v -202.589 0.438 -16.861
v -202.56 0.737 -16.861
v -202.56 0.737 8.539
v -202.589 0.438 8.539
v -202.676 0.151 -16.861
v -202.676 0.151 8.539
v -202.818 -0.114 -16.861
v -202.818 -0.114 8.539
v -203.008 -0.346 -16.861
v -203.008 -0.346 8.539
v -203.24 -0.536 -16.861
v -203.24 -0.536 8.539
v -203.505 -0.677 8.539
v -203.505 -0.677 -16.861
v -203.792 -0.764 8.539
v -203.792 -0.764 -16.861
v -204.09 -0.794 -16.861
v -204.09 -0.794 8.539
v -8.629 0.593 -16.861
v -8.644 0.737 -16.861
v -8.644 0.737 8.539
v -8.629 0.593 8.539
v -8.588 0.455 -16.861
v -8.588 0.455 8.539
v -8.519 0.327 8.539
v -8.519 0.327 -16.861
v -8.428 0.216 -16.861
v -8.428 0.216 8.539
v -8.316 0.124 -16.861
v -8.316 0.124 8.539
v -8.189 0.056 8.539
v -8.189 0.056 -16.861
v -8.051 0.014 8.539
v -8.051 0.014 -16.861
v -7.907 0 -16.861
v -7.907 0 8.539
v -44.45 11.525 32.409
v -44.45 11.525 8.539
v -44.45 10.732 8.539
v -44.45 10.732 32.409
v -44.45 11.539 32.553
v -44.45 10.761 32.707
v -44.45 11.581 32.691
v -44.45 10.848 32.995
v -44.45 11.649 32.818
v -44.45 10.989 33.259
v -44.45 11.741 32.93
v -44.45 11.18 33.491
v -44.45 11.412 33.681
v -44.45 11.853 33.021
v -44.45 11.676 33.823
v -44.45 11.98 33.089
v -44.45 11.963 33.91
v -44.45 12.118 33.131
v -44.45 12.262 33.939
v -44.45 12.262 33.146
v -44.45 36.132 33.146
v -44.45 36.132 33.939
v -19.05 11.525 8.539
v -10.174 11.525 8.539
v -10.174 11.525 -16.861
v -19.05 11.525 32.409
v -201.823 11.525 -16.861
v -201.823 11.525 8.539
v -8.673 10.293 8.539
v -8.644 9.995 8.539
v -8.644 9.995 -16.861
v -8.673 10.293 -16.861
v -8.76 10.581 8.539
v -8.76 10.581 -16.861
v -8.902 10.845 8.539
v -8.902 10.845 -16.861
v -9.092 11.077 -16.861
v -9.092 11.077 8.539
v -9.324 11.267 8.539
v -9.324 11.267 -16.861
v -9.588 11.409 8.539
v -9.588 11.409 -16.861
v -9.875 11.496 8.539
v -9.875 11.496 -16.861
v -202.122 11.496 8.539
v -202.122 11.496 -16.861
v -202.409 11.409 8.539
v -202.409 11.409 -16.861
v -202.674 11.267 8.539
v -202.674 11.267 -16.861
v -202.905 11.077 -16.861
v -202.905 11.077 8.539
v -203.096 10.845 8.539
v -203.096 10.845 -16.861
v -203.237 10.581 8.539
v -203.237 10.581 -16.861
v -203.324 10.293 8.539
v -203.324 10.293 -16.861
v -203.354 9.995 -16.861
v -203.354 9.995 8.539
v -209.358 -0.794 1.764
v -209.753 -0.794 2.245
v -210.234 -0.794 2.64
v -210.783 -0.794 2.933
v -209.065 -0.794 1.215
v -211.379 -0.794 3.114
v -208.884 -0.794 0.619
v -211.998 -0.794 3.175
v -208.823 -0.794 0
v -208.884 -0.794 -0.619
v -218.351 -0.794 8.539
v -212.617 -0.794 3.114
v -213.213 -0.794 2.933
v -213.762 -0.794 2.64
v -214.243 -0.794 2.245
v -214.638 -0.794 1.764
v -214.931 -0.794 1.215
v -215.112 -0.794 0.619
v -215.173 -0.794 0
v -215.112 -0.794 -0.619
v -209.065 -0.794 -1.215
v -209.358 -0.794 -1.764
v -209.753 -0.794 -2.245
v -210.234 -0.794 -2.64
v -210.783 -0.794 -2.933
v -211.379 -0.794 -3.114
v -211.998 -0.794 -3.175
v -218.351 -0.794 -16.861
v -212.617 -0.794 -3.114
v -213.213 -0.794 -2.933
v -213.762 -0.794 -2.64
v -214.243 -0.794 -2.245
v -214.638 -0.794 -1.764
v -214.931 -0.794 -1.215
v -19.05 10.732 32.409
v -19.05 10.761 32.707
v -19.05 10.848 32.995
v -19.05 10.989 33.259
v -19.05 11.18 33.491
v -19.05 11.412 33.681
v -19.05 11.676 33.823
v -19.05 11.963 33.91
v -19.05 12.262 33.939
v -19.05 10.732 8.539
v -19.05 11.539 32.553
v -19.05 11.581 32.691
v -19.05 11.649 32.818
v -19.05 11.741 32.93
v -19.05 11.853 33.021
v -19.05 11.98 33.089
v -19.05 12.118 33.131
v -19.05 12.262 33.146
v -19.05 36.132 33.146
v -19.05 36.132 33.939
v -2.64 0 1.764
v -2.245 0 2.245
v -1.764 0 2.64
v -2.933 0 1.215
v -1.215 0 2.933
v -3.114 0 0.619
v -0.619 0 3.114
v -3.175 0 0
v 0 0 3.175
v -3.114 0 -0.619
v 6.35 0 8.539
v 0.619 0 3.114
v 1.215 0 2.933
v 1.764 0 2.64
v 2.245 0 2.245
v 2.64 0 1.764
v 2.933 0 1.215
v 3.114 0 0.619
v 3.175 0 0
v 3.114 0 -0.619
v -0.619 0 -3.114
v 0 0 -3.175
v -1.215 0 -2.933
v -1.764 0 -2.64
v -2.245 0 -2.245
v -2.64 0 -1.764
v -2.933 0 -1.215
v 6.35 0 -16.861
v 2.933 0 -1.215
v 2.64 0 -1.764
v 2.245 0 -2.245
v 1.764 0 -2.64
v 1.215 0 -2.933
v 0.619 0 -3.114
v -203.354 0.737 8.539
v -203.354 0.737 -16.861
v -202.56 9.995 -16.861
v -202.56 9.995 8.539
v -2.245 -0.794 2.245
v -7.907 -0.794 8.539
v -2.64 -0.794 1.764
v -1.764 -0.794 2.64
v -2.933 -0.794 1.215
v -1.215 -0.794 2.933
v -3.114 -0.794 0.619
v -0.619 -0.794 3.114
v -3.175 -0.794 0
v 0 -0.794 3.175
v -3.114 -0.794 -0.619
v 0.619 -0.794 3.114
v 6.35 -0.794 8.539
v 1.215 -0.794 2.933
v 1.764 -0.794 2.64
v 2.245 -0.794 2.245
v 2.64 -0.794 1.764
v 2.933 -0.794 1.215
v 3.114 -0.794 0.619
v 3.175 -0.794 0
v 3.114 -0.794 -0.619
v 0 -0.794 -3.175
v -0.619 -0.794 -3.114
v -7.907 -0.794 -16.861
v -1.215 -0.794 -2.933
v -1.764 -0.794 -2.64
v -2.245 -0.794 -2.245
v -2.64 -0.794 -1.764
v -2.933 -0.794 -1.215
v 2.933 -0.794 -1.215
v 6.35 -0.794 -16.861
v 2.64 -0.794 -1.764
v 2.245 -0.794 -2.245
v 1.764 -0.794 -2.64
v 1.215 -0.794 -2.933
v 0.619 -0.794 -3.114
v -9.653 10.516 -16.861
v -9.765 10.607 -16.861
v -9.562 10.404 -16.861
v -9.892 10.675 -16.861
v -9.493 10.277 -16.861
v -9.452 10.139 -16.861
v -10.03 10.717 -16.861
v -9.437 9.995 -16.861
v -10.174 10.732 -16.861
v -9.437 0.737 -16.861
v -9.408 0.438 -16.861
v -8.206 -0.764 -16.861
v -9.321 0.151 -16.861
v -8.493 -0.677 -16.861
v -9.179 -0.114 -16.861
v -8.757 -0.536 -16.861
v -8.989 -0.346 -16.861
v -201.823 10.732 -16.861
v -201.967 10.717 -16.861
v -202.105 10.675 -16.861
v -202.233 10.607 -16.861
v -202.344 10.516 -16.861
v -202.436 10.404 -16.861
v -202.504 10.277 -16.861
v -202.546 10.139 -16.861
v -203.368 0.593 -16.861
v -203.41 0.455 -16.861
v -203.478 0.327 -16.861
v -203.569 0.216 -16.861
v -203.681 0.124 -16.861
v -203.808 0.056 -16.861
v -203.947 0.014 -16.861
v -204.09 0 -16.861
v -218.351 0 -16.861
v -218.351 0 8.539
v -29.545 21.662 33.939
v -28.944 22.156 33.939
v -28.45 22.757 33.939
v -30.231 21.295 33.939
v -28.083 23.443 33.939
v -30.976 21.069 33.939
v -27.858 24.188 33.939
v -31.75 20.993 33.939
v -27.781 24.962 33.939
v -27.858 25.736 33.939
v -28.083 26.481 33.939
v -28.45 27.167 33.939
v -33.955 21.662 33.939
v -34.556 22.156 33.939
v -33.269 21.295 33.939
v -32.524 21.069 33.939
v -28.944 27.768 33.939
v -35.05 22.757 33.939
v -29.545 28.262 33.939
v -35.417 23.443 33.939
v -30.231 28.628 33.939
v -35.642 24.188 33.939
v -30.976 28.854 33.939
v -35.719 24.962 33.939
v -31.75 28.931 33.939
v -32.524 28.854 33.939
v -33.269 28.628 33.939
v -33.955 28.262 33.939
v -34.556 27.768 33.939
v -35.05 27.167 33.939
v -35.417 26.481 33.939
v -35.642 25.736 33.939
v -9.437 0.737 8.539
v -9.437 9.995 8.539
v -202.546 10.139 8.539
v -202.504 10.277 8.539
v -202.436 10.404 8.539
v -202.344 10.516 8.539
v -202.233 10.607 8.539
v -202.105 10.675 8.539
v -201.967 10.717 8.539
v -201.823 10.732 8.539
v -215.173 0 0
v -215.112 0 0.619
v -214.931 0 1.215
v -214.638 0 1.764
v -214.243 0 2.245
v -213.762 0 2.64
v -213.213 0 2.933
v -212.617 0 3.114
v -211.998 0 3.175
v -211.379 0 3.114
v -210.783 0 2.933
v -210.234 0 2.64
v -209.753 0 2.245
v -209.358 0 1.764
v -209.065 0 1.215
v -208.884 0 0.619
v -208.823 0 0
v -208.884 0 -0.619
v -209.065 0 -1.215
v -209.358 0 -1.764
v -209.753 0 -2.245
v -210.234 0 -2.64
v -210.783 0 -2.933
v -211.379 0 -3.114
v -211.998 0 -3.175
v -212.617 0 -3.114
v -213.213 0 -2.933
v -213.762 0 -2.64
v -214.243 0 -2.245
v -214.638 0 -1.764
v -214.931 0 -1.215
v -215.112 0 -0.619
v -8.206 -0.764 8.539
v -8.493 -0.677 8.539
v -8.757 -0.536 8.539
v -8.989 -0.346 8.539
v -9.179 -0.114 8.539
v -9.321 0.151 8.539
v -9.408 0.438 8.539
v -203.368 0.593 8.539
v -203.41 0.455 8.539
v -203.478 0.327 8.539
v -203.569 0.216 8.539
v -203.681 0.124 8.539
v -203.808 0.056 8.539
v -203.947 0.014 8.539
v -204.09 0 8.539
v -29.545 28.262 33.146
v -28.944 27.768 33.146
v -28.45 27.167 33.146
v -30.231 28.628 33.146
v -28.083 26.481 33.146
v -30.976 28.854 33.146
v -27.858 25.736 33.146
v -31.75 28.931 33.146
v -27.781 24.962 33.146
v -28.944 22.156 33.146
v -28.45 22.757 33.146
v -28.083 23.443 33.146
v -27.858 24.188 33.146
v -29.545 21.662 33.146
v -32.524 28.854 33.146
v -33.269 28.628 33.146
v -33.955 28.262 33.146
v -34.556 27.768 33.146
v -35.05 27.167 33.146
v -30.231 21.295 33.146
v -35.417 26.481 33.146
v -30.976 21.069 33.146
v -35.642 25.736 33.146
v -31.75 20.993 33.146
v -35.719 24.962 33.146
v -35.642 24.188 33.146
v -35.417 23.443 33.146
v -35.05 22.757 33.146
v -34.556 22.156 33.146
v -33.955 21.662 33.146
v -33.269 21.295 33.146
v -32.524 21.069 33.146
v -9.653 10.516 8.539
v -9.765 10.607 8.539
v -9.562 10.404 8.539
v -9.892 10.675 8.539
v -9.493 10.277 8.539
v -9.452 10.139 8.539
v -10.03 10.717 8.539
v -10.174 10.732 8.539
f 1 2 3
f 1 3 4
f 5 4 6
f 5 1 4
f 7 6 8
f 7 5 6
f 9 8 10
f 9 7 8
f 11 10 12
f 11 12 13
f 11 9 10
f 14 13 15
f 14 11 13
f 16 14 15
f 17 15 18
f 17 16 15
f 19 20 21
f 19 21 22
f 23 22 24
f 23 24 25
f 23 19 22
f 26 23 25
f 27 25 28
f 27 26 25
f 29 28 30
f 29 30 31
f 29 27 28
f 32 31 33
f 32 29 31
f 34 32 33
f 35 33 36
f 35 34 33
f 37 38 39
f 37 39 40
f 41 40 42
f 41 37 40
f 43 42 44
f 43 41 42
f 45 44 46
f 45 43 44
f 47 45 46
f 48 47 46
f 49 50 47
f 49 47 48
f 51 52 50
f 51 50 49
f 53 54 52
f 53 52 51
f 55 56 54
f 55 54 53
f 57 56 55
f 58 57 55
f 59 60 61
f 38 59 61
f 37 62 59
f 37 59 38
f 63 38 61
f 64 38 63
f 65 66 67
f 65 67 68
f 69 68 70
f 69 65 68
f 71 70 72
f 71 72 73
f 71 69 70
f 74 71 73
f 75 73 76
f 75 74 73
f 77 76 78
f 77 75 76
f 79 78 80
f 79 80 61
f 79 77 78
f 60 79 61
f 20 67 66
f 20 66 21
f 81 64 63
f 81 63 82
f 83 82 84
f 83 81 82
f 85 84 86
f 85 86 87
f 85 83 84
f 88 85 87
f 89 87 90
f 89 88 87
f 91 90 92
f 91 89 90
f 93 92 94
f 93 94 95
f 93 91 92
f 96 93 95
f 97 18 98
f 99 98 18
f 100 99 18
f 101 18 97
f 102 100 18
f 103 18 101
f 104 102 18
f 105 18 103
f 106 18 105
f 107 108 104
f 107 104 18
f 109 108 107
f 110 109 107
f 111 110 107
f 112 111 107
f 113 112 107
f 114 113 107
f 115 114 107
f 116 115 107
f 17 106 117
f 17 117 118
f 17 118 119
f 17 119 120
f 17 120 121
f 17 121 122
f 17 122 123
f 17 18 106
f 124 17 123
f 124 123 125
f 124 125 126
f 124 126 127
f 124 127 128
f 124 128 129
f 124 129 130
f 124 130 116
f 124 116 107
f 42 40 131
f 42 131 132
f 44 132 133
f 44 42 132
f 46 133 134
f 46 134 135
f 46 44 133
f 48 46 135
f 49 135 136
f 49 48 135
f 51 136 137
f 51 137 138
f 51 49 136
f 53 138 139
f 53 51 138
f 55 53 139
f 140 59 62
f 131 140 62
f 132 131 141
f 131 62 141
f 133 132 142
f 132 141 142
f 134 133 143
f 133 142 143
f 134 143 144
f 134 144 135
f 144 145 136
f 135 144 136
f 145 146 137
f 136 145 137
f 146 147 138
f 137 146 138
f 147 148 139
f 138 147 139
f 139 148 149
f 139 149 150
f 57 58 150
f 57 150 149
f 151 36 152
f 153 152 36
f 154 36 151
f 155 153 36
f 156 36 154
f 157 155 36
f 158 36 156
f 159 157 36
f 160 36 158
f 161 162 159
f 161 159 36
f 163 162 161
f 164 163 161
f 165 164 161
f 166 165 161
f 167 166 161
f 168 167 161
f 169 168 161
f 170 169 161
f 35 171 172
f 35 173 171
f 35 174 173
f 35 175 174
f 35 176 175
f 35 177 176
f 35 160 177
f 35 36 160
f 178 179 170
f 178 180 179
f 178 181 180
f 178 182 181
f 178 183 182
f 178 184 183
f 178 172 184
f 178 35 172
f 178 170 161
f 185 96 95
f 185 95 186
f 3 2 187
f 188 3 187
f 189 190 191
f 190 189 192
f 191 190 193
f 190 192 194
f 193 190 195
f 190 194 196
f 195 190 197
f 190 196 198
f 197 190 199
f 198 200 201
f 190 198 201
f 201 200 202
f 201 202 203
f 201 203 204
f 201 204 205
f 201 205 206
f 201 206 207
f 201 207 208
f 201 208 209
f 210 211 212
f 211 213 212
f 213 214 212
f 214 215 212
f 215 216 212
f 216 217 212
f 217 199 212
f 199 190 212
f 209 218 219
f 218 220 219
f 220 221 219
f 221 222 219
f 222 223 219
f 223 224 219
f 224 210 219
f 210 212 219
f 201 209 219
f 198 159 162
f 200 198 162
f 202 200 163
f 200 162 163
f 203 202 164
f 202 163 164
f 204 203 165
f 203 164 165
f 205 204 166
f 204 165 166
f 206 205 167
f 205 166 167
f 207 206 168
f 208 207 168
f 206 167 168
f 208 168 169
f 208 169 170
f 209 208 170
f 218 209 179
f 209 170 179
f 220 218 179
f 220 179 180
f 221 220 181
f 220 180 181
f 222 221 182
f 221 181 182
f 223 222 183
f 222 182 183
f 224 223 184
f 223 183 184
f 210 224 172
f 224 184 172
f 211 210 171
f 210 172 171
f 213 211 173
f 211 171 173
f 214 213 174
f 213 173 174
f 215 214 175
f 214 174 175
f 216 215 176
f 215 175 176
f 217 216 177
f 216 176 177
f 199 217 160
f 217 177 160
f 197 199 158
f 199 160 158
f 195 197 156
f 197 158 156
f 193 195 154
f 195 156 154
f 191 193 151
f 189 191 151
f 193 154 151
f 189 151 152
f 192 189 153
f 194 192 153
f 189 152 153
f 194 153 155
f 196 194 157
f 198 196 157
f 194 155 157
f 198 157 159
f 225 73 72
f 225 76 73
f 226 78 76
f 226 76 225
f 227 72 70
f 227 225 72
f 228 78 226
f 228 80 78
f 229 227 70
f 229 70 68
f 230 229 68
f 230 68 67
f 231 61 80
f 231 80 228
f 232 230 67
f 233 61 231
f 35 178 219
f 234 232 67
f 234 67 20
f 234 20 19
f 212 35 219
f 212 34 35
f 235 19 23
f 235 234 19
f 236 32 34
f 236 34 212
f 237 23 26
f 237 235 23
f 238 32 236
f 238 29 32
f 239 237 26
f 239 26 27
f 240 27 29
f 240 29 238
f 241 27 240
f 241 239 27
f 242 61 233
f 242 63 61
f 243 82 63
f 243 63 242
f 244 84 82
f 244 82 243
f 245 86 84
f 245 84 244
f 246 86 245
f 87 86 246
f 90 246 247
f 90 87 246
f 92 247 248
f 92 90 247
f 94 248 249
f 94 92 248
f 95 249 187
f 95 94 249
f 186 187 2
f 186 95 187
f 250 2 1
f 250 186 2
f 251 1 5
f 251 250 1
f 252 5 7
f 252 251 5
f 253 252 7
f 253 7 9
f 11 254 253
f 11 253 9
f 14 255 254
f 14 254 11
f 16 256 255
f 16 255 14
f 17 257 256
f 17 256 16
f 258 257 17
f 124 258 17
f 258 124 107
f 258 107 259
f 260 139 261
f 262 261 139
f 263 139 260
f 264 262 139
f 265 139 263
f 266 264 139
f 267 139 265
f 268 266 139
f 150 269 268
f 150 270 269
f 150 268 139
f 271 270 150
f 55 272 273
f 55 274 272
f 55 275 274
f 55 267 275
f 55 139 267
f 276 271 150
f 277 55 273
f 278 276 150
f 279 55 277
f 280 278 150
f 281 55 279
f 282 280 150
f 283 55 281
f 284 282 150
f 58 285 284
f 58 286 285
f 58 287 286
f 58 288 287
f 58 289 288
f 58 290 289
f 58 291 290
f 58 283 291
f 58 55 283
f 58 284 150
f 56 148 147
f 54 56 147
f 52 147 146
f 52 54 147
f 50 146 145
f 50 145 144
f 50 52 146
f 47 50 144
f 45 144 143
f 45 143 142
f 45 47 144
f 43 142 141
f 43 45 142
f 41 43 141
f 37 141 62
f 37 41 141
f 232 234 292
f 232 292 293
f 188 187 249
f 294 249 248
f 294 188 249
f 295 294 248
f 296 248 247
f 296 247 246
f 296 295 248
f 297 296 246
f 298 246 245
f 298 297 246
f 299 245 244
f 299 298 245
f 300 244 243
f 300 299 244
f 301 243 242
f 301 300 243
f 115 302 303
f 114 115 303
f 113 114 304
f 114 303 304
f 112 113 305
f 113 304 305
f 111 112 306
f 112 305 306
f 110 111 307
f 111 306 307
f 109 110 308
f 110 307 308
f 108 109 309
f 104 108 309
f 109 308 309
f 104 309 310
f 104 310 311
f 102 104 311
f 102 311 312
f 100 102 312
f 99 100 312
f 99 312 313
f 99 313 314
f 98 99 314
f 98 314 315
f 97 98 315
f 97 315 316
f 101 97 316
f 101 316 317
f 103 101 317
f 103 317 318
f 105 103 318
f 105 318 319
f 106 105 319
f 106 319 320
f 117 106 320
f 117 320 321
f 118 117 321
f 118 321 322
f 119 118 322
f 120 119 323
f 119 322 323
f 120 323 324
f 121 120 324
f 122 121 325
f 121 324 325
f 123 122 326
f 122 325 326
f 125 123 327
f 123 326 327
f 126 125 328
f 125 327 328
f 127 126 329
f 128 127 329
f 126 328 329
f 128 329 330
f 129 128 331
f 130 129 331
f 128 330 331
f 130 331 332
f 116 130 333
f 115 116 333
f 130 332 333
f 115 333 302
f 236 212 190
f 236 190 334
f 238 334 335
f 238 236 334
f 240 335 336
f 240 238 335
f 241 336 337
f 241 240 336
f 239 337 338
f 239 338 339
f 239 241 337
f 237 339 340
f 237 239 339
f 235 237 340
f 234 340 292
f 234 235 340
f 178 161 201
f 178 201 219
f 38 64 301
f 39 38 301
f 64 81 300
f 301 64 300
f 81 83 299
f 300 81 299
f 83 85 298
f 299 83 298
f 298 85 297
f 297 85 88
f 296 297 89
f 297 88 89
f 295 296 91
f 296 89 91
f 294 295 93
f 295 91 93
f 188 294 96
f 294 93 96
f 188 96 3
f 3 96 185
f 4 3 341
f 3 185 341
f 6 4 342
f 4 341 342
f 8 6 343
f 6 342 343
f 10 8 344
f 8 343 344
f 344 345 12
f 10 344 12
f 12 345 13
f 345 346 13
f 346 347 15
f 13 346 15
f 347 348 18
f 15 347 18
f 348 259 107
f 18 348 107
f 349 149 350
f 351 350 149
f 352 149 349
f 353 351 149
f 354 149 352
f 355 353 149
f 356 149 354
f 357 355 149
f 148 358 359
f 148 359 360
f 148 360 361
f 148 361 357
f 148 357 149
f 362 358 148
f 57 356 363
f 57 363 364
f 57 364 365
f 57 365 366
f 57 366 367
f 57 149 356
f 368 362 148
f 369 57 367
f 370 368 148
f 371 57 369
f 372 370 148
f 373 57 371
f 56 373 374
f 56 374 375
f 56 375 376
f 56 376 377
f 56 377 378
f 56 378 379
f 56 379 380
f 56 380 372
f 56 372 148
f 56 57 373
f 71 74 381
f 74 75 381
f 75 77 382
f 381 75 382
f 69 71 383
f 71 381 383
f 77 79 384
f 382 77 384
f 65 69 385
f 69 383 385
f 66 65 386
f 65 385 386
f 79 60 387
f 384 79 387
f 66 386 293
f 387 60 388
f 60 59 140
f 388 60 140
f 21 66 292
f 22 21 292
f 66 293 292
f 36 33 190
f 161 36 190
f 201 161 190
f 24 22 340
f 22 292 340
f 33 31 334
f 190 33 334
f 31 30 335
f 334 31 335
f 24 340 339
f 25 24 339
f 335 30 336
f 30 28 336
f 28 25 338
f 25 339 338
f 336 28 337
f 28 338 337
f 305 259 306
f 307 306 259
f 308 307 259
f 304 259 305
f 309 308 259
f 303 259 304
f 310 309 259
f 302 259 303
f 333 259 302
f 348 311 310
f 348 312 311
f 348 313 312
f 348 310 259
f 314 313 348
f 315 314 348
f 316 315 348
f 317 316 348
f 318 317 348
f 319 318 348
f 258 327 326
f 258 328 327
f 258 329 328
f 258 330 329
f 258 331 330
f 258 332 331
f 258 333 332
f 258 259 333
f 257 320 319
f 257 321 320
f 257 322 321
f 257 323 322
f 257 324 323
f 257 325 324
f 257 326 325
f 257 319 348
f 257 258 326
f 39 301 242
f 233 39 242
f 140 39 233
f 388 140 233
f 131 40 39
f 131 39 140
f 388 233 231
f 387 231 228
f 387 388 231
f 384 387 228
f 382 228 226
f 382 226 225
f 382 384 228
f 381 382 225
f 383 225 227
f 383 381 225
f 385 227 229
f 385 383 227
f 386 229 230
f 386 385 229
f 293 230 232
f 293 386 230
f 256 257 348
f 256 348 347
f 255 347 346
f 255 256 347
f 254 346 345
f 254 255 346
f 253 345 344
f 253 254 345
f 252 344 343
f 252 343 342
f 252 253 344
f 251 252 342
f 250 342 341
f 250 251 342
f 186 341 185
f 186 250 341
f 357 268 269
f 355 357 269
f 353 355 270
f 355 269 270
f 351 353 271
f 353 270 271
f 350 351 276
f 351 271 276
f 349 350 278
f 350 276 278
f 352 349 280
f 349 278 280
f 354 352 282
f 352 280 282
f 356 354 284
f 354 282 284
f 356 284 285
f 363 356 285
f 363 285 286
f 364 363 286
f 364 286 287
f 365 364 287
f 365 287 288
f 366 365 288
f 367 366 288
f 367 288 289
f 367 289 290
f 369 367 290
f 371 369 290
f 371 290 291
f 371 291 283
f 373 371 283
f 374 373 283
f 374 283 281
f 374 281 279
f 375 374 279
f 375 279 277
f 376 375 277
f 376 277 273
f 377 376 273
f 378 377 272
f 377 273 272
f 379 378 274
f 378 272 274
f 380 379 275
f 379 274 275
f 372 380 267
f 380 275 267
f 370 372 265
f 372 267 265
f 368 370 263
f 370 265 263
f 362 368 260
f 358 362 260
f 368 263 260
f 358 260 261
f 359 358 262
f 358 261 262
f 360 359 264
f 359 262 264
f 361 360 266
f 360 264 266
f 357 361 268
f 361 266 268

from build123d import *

# Parameters (mm, degrees)
SKETCH1_W                    = 14.25702
SKETCH1_H                    = 25.4
SKETCH1_R                    = 3.175
BASE_FLANGE1_DEPTH           = 0.79375
EDGE_FLANGE1_DEPTH           = 25.4
EDGE_FLANGE2_DEPTH           = 25.4
EDGE_FLANGE3_DEPTH           = 25.4
EDGE_FLANGE4_STRIP_W         = 4.6482
EDGE_FLANGE4_STRIP_H         = 0.79375
EDGE_FLANGE4_STRIP_CUT_DEPTH = 25.4
EDGE_FLANGE4_DEPTH           = 25.4
SKETCH16_R                   = 3.175
CUT_EXTRUDE1_DEPTH           = 220.30417026
SKETCH19_W                   = 25.4
SKETCH19_H                   = 25.4
TAB1_DEPTH                   = 0.79375
EDGE_FLANGE5_STRIP_W         = 4.6482
EDGE_FLANGE5_STRIP_H         = 0.79375
EDGE_FLANGE5_STRIP_CUT_DEPTH = 25.4
EDGE_FLANGE5_DEPTH           = 25.4
SKETCH25_R                   = 3.96875
CUT_EXTRUDE2_DEPTH           = 228.075600106


# Sheet-metal steps are written as plain solids
with BuildPart() as part:
    # Sketch1 → Base-Flange1 (new body)
    with BuildSketch(Plane(origin=(0, 0, 0), x_dir=(1, 0, 0), z_dir=(0, 1, 0))):
        with Locations((-0.77851, 4.160748346)):
            Rectangle(SKETCH1_W, SKETCH1_H)
        with Locations(Location((0, 0, 0), (0, 0, 270))):
            Circle(SKETCH1_R, mode=Mode.SUBTRACT)
    extrude(amount=-BASE_FLANGE1_DEPTH)

    # Edge-Flange1 section (across the edge) → Edge-Flange1 (add)
    with BuildSketch(Plane(origin=(-8.64362, 0, -16.860748346), x_dir=(1, 0, 0), z_dir=(0, 0, 1))):
        with BuildLine():
            Line((-0.79375, 0.7366), (-0.79375, 9.9949))
            Line((-0.79375, 9.9949), (0, 9.9949))
            Line((0, 9.9949), (0, 0.7366))
            ThreePointArc((0, 0.7366), (0.215745145, 0.215745145), (0.7366, 0))
            Line((0.7366, 0), (0.7366, -0.79375))
            ThreePointArc((0.7366, -0.79375), (-0.345520863, -0.345520863), (-0.79375, 0.7366))
        make_face()
    extrude(amount=EDGE_FLANGE1_DEPTH)

    # Edge-Flange2 section (across the edge) → Edge-Flange2 (add)
    with BuildSketch(Plane(origin=(-9.43737, 10.7315, 8.539251654), x_dir=(0, -1, 0), z_dir=(0, 0, -1))):
        with BuildLine():
            Line((-0.79375, 0.7366), (-0.79375, 192.38595))
            Line((-0.79375, 192.38595), (0, 192.38595))
            Line((0, 192.38595), (0, 0.7366))
            ThreePointArc((0, 0.7366), (0.215745145, 0.215745145), (0.7366, 0))
            Line((0.7366, 0), (0.7366, -0.79375))
            ThreePointArc((0.7366, -0.79375), (-0.345520863, -0.345520863), (-0.79375, 0.7366))
        make_face()
    extrude(amount=EDGE_FLANGE2_DEPTH)

    # Edge-Flange3 section (across the edge) → Edge-Flange3 (add)
    with BuildSketch(Plane(origin=(-202.55992, 10.7315, 8.539251654), x_dir=(1, 0, 0), z_dir=(0, 0, -1))):
        with BuildLine():
            Line((-0.79375, 0.7366), (-0.79375, 11.52525))
            Line((-0.79375, 11.52525), (0, 11.52525))
            Line((0, 11.52525), (0, 0.7366))
            ThreePointArc((0, 0.7366), (0.215745145, 0.215745145), (0.7366, 0))
            Line((0.7366, 0), (0.7366, -0.79375))
            ThreePointArc((0.7366, -0.79375), (-0.345520863, -0.345520863), (-0.79375, 0.7366))
        make_face()
    extrude(amount=EDGE_FLANGE3_DEPTH)

    # Edge-Flange4 strip (across the edge) → Edge-Flange4 strip cut (cut)
    with BuildSketch(Plane(origin=(-203.35367, -0.79375, -16.860748346), x_dir=(0, 1, 0), z_dir=(0, 0, 1))):
        with Locations((-0.79375, -0.396875)):
            Rectangle(EDGE_FLANGE4_STRIP_W, EDGE_FLANGE4_STRIP_H)
    extrude(amount=EDGE_FLANGE4_STRIP_CUT_DEPTH, mode=Mode.SUBTRACT)

    # Edge-Flange4 section (across the edge) → Edge-Flange4 (add)
    with BuildSketch(Plane(origin=(-203.35367, -0.79375, -16.860748346), x_dir=(0, 1, 0), z_dir=(0, 0, 1))):
        with BuildLine():
            Line((0, 0.7366), (0, 14.99743))
            Line((0, 14.99743), (0.79375, 14.99743))
            Line((0.79375, 14.99743), (0.79375, 0.7366))
            ThreePointArc((0.79375, 0.7366), (1.009495145, 0.215745145), (1.53035, 0))
            Line((1.53035, 0), (1.53035, -0.79375))
            ThreePointArc((1.53035, -0.79375), (0.448229137, -0.345520863), (0, 0.7366))
        make_face()
    extrude(amount=EDGE_FLANGE4_DEPTH)

    # Sketch16 → Cut-Extrude1 (cut, through all)
    with BuildSketch(Plane(origin=(0, 0, 0), x_dir=(1, 0, 0), z_dir=(0, 1, 0))):
        with Locations(Location((-211.998031426, 0, 0), (0, 0, 180))):
            Circle(SKETCH16_R)
    extrude(amount=-CUT_EXTRUDE1_DEPTH, mode=Mode.SUBTRACT)

    # Sketch19 → Tab1 (add)
    with BuildSketch(Plane(origin=(0, 11.52525, 0), x_dir=(1, 0, 0), z_dir=(0, 1, 0))):
        with Locations((-31.75, -21.239251654)):
            Rectangle(SKETCH19_W, SKETCH19_H)
    extrude(amount=-TAB1_DEPTH)

    # Edge-Flange5 strip (across the edge) → Edge-Flange5 strip cut (cut)
    with BuildSketch(Plane(origin=(-44.45, 11.52525, 33.939251654), x_dir=(0, 0, -1), z_dir=(1, 0, 0))):
        with Locations((-0.79375, -0.396875)):
            Rectangle(EDGE_FLANGE5_STRIP_W, EDGE_FLANGE5_STRIP_H)
    extrude(amount=EDGE_FLANGE5_STRIP_CUT_DEPTH, mode=Mode.SUBTRACT)

    # Edge-Flange5 section (across the edge) → Edge-Flange5 (add)
    with BuildSketch(Plane(origin=(-44.45, 11.52525, 33.939251654), x_dir=(0, 0, -1), z_dir=(1, 0, 0))):
        with BuildLine():
            Line((0, 0.7366), (0, 24.60625))
            Line((0, 24.60625), (0.79375, 24.60625))
            Line((0.79375, 24.60625), (0.79375, 0.7366))
            ThreePointArc((0.79375, 0.7366), (1.009495145, 0.215745145), (1.53035, 0))
            Line((1.53035, 0), (1.53035, -0.79375))
            ThreePointArc((1.53035, -0.79375), (0.448229137, -0.345520863), (0, 0.7366))
        make_face()
    extrude(amount=EDGE_FLANGE5_DEPTH)

    # Sketch25 → Cut-Extrude2 (cut, through all)
    with BuildSketch(Plane.XY.offset(33.939251654)):
        with Locations((-31.75, 24.96185)):
            Circle(SKETCH25_R)
    extrude(amount=-CUT_EXTRUDE2_DEPTH, mode=Mode.SUBTRACT)


solid = part.part
